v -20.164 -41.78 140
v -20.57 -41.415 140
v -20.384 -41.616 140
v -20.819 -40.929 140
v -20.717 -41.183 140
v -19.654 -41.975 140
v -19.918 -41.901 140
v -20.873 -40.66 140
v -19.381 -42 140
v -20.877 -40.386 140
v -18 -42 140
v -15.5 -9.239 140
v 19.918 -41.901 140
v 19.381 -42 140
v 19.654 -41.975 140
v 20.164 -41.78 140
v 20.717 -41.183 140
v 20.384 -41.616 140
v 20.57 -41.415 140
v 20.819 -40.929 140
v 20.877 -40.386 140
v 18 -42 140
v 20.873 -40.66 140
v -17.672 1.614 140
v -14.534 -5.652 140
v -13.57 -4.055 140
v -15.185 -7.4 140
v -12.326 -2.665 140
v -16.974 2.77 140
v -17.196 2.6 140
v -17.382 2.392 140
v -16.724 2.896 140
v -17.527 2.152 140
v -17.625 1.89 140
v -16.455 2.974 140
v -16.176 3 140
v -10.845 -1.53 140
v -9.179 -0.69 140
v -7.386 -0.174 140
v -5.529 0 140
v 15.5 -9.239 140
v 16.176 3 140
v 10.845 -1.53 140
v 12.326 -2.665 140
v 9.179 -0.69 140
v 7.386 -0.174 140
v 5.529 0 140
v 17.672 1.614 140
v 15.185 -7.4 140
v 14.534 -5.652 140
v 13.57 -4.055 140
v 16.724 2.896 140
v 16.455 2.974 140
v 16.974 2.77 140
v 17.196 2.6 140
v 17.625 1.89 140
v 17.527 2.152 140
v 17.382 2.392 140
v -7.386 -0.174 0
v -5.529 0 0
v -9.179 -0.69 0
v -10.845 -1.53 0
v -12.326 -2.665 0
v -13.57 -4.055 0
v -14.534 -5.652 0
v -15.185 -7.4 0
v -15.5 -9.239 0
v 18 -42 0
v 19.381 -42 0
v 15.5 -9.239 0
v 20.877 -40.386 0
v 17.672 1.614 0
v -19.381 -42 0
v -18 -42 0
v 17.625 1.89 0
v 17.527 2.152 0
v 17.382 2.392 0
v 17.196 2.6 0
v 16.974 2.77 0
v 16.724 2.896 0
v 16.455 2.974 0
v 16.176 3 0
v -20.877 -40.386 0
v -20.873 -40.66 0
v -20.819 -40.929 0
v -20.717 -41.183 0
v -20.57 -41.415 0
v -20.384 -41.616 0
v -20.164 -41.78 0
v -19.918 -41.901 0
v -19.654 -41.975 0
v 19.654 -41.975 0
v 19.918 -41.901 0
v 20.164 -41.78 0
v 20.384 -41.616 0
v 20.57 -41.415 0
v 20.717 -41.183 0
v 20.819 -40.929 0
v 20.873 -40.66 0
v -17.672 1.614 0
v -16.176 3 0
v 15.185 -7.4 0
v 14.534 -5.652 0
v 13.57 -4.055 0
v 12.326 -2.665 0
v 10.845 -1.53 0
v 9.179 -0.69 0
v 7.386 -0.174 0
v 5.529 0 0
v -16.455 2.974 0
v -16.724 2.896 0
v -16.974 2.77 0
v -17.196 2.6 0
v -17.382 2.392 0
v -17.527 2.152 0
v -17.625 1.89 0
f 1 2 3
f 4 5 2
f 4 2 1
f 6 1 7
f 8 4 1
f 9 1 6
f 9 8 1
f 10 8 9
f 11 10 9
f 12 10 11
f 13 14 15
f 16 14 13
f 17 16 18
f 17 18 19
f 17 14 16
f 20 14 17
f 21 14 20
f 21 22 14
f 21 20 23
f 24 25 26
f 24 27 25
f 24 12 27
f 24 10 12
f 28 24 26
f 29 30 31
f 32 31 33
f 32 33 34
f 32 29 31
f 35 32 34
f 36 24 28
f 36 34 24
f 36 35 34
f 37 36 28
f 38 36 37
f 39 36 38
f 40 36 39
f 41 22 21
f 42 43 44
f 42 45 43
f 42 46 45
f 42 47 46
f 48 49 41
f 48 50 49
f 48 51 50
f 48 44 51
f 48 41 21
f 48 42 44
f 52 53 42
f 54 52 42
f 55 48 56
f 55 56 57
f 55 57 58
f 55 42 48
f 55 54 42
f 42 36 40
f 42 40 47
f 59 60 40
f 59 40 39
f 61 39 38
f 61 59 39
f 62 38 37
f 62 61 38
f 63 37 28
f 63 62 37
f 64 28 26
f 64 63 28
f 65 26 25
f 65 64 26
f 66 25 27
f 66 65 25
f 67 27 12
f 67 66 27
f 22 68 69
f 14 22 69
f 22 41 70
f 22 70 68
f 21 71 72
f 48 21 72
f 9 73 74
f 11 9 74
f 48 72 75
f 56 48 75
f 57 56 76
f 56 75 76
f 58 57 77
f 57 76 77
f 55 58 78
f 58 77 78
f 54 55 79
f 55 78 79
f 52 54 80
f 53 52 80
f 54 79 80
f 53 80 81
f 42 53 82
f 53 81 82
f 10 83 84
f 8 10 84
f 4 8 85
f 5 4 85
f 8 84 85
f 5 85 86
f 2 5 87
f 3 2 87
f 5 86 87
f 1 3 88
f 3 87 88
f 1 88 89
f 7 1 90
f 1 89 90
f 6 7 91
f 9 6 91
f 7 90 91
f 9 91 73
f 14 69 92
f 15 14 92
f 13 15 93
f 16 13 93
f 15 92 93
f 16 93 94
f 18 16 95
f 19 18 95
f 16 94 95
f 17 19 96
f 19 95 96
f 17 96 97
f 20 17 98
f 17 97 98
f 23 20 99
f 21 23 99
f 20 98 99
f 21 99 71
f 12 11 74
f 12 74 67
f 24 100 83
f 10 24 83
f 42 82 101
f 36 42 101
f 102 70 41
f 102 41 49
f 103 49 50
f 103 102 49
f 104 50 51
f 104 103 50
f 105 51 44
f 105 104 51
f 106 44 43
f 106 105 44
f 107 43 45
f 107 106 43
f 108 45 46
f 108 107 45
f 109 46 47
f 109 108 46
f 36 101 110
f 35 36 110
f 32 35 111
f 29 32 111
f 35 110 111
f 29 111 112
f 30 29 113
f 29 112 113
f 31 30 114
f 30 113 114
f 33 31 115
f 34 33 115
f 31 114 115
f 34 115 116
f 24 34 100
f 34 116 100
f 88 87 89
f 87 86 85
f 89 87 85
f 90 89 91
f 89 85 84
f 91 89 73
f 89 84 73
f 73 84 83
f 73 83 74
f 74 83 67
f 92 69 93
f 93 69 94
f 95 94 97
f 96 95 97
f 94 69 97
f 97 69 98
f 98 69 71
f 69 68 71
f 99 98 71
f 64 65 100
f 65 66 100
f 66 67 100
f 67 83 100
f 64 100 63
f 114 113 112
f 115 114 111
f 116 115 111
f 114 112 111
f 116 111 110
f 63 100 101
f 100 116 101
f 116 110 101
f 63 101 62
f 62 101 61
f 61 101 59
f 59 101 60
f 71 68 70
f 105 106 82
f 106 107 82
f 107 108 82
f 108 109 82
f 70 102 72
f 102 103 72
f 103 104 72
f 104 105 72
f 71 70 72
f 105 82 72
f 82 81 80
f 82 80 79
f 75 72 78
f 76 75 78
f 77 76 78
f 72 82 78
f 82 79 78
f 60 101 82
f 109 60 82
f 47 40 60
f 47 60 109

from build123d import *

# Parameters (mm, degrees)
PAD_DEPTH = 140


with BuildPart() as part:
    # Sketch → Pad (new body)
    with BuildSketch(Plane.XY):
        with BuildLine():
            Line((16.176132, 3), (-16.176132, 3))
            ThreePointArc((-16.176132, 3), (-17.195642, 2.600273), (-17.671784, 1.614134))
            Line((-17.671784, 1.614134), (-20.876825, -40.385866))
            ThreePointArc((-20.876825, -40.385866), (-20.481446, -41.519509), (-19.381173, -42))
            Line((-19.381173, -42), (-18, -42))
            Line((-18, -42), (-15.5, -9.239107))
            ThreePointArc((-5.52899, 0), (-12.32572, -2.664847), (-15.5, -9.239107))
            Line((-5.52899, 0), (5.52899, 0))
            ThreePointArc((15.5, -9.239107), (12.32572, -2.664847), (5.52899, 0))
            Line((15.5, -9.239107), (18, -42))
            Line((18, -42), (19.381173, -42))
            ThreePointArc((19.381173, -42), (20.481446, -41.519509), (20.876825, -40.385866))
            Line((20.876825, -40.385866), (17.671784, 1.614134))
            ThreePointArc((17.671784, 1.614134), (17.195642, 2.600273), (16.176132, 3))
        make_face()
    extrude(amount=PAD_DEPTH)


solid = part.part
